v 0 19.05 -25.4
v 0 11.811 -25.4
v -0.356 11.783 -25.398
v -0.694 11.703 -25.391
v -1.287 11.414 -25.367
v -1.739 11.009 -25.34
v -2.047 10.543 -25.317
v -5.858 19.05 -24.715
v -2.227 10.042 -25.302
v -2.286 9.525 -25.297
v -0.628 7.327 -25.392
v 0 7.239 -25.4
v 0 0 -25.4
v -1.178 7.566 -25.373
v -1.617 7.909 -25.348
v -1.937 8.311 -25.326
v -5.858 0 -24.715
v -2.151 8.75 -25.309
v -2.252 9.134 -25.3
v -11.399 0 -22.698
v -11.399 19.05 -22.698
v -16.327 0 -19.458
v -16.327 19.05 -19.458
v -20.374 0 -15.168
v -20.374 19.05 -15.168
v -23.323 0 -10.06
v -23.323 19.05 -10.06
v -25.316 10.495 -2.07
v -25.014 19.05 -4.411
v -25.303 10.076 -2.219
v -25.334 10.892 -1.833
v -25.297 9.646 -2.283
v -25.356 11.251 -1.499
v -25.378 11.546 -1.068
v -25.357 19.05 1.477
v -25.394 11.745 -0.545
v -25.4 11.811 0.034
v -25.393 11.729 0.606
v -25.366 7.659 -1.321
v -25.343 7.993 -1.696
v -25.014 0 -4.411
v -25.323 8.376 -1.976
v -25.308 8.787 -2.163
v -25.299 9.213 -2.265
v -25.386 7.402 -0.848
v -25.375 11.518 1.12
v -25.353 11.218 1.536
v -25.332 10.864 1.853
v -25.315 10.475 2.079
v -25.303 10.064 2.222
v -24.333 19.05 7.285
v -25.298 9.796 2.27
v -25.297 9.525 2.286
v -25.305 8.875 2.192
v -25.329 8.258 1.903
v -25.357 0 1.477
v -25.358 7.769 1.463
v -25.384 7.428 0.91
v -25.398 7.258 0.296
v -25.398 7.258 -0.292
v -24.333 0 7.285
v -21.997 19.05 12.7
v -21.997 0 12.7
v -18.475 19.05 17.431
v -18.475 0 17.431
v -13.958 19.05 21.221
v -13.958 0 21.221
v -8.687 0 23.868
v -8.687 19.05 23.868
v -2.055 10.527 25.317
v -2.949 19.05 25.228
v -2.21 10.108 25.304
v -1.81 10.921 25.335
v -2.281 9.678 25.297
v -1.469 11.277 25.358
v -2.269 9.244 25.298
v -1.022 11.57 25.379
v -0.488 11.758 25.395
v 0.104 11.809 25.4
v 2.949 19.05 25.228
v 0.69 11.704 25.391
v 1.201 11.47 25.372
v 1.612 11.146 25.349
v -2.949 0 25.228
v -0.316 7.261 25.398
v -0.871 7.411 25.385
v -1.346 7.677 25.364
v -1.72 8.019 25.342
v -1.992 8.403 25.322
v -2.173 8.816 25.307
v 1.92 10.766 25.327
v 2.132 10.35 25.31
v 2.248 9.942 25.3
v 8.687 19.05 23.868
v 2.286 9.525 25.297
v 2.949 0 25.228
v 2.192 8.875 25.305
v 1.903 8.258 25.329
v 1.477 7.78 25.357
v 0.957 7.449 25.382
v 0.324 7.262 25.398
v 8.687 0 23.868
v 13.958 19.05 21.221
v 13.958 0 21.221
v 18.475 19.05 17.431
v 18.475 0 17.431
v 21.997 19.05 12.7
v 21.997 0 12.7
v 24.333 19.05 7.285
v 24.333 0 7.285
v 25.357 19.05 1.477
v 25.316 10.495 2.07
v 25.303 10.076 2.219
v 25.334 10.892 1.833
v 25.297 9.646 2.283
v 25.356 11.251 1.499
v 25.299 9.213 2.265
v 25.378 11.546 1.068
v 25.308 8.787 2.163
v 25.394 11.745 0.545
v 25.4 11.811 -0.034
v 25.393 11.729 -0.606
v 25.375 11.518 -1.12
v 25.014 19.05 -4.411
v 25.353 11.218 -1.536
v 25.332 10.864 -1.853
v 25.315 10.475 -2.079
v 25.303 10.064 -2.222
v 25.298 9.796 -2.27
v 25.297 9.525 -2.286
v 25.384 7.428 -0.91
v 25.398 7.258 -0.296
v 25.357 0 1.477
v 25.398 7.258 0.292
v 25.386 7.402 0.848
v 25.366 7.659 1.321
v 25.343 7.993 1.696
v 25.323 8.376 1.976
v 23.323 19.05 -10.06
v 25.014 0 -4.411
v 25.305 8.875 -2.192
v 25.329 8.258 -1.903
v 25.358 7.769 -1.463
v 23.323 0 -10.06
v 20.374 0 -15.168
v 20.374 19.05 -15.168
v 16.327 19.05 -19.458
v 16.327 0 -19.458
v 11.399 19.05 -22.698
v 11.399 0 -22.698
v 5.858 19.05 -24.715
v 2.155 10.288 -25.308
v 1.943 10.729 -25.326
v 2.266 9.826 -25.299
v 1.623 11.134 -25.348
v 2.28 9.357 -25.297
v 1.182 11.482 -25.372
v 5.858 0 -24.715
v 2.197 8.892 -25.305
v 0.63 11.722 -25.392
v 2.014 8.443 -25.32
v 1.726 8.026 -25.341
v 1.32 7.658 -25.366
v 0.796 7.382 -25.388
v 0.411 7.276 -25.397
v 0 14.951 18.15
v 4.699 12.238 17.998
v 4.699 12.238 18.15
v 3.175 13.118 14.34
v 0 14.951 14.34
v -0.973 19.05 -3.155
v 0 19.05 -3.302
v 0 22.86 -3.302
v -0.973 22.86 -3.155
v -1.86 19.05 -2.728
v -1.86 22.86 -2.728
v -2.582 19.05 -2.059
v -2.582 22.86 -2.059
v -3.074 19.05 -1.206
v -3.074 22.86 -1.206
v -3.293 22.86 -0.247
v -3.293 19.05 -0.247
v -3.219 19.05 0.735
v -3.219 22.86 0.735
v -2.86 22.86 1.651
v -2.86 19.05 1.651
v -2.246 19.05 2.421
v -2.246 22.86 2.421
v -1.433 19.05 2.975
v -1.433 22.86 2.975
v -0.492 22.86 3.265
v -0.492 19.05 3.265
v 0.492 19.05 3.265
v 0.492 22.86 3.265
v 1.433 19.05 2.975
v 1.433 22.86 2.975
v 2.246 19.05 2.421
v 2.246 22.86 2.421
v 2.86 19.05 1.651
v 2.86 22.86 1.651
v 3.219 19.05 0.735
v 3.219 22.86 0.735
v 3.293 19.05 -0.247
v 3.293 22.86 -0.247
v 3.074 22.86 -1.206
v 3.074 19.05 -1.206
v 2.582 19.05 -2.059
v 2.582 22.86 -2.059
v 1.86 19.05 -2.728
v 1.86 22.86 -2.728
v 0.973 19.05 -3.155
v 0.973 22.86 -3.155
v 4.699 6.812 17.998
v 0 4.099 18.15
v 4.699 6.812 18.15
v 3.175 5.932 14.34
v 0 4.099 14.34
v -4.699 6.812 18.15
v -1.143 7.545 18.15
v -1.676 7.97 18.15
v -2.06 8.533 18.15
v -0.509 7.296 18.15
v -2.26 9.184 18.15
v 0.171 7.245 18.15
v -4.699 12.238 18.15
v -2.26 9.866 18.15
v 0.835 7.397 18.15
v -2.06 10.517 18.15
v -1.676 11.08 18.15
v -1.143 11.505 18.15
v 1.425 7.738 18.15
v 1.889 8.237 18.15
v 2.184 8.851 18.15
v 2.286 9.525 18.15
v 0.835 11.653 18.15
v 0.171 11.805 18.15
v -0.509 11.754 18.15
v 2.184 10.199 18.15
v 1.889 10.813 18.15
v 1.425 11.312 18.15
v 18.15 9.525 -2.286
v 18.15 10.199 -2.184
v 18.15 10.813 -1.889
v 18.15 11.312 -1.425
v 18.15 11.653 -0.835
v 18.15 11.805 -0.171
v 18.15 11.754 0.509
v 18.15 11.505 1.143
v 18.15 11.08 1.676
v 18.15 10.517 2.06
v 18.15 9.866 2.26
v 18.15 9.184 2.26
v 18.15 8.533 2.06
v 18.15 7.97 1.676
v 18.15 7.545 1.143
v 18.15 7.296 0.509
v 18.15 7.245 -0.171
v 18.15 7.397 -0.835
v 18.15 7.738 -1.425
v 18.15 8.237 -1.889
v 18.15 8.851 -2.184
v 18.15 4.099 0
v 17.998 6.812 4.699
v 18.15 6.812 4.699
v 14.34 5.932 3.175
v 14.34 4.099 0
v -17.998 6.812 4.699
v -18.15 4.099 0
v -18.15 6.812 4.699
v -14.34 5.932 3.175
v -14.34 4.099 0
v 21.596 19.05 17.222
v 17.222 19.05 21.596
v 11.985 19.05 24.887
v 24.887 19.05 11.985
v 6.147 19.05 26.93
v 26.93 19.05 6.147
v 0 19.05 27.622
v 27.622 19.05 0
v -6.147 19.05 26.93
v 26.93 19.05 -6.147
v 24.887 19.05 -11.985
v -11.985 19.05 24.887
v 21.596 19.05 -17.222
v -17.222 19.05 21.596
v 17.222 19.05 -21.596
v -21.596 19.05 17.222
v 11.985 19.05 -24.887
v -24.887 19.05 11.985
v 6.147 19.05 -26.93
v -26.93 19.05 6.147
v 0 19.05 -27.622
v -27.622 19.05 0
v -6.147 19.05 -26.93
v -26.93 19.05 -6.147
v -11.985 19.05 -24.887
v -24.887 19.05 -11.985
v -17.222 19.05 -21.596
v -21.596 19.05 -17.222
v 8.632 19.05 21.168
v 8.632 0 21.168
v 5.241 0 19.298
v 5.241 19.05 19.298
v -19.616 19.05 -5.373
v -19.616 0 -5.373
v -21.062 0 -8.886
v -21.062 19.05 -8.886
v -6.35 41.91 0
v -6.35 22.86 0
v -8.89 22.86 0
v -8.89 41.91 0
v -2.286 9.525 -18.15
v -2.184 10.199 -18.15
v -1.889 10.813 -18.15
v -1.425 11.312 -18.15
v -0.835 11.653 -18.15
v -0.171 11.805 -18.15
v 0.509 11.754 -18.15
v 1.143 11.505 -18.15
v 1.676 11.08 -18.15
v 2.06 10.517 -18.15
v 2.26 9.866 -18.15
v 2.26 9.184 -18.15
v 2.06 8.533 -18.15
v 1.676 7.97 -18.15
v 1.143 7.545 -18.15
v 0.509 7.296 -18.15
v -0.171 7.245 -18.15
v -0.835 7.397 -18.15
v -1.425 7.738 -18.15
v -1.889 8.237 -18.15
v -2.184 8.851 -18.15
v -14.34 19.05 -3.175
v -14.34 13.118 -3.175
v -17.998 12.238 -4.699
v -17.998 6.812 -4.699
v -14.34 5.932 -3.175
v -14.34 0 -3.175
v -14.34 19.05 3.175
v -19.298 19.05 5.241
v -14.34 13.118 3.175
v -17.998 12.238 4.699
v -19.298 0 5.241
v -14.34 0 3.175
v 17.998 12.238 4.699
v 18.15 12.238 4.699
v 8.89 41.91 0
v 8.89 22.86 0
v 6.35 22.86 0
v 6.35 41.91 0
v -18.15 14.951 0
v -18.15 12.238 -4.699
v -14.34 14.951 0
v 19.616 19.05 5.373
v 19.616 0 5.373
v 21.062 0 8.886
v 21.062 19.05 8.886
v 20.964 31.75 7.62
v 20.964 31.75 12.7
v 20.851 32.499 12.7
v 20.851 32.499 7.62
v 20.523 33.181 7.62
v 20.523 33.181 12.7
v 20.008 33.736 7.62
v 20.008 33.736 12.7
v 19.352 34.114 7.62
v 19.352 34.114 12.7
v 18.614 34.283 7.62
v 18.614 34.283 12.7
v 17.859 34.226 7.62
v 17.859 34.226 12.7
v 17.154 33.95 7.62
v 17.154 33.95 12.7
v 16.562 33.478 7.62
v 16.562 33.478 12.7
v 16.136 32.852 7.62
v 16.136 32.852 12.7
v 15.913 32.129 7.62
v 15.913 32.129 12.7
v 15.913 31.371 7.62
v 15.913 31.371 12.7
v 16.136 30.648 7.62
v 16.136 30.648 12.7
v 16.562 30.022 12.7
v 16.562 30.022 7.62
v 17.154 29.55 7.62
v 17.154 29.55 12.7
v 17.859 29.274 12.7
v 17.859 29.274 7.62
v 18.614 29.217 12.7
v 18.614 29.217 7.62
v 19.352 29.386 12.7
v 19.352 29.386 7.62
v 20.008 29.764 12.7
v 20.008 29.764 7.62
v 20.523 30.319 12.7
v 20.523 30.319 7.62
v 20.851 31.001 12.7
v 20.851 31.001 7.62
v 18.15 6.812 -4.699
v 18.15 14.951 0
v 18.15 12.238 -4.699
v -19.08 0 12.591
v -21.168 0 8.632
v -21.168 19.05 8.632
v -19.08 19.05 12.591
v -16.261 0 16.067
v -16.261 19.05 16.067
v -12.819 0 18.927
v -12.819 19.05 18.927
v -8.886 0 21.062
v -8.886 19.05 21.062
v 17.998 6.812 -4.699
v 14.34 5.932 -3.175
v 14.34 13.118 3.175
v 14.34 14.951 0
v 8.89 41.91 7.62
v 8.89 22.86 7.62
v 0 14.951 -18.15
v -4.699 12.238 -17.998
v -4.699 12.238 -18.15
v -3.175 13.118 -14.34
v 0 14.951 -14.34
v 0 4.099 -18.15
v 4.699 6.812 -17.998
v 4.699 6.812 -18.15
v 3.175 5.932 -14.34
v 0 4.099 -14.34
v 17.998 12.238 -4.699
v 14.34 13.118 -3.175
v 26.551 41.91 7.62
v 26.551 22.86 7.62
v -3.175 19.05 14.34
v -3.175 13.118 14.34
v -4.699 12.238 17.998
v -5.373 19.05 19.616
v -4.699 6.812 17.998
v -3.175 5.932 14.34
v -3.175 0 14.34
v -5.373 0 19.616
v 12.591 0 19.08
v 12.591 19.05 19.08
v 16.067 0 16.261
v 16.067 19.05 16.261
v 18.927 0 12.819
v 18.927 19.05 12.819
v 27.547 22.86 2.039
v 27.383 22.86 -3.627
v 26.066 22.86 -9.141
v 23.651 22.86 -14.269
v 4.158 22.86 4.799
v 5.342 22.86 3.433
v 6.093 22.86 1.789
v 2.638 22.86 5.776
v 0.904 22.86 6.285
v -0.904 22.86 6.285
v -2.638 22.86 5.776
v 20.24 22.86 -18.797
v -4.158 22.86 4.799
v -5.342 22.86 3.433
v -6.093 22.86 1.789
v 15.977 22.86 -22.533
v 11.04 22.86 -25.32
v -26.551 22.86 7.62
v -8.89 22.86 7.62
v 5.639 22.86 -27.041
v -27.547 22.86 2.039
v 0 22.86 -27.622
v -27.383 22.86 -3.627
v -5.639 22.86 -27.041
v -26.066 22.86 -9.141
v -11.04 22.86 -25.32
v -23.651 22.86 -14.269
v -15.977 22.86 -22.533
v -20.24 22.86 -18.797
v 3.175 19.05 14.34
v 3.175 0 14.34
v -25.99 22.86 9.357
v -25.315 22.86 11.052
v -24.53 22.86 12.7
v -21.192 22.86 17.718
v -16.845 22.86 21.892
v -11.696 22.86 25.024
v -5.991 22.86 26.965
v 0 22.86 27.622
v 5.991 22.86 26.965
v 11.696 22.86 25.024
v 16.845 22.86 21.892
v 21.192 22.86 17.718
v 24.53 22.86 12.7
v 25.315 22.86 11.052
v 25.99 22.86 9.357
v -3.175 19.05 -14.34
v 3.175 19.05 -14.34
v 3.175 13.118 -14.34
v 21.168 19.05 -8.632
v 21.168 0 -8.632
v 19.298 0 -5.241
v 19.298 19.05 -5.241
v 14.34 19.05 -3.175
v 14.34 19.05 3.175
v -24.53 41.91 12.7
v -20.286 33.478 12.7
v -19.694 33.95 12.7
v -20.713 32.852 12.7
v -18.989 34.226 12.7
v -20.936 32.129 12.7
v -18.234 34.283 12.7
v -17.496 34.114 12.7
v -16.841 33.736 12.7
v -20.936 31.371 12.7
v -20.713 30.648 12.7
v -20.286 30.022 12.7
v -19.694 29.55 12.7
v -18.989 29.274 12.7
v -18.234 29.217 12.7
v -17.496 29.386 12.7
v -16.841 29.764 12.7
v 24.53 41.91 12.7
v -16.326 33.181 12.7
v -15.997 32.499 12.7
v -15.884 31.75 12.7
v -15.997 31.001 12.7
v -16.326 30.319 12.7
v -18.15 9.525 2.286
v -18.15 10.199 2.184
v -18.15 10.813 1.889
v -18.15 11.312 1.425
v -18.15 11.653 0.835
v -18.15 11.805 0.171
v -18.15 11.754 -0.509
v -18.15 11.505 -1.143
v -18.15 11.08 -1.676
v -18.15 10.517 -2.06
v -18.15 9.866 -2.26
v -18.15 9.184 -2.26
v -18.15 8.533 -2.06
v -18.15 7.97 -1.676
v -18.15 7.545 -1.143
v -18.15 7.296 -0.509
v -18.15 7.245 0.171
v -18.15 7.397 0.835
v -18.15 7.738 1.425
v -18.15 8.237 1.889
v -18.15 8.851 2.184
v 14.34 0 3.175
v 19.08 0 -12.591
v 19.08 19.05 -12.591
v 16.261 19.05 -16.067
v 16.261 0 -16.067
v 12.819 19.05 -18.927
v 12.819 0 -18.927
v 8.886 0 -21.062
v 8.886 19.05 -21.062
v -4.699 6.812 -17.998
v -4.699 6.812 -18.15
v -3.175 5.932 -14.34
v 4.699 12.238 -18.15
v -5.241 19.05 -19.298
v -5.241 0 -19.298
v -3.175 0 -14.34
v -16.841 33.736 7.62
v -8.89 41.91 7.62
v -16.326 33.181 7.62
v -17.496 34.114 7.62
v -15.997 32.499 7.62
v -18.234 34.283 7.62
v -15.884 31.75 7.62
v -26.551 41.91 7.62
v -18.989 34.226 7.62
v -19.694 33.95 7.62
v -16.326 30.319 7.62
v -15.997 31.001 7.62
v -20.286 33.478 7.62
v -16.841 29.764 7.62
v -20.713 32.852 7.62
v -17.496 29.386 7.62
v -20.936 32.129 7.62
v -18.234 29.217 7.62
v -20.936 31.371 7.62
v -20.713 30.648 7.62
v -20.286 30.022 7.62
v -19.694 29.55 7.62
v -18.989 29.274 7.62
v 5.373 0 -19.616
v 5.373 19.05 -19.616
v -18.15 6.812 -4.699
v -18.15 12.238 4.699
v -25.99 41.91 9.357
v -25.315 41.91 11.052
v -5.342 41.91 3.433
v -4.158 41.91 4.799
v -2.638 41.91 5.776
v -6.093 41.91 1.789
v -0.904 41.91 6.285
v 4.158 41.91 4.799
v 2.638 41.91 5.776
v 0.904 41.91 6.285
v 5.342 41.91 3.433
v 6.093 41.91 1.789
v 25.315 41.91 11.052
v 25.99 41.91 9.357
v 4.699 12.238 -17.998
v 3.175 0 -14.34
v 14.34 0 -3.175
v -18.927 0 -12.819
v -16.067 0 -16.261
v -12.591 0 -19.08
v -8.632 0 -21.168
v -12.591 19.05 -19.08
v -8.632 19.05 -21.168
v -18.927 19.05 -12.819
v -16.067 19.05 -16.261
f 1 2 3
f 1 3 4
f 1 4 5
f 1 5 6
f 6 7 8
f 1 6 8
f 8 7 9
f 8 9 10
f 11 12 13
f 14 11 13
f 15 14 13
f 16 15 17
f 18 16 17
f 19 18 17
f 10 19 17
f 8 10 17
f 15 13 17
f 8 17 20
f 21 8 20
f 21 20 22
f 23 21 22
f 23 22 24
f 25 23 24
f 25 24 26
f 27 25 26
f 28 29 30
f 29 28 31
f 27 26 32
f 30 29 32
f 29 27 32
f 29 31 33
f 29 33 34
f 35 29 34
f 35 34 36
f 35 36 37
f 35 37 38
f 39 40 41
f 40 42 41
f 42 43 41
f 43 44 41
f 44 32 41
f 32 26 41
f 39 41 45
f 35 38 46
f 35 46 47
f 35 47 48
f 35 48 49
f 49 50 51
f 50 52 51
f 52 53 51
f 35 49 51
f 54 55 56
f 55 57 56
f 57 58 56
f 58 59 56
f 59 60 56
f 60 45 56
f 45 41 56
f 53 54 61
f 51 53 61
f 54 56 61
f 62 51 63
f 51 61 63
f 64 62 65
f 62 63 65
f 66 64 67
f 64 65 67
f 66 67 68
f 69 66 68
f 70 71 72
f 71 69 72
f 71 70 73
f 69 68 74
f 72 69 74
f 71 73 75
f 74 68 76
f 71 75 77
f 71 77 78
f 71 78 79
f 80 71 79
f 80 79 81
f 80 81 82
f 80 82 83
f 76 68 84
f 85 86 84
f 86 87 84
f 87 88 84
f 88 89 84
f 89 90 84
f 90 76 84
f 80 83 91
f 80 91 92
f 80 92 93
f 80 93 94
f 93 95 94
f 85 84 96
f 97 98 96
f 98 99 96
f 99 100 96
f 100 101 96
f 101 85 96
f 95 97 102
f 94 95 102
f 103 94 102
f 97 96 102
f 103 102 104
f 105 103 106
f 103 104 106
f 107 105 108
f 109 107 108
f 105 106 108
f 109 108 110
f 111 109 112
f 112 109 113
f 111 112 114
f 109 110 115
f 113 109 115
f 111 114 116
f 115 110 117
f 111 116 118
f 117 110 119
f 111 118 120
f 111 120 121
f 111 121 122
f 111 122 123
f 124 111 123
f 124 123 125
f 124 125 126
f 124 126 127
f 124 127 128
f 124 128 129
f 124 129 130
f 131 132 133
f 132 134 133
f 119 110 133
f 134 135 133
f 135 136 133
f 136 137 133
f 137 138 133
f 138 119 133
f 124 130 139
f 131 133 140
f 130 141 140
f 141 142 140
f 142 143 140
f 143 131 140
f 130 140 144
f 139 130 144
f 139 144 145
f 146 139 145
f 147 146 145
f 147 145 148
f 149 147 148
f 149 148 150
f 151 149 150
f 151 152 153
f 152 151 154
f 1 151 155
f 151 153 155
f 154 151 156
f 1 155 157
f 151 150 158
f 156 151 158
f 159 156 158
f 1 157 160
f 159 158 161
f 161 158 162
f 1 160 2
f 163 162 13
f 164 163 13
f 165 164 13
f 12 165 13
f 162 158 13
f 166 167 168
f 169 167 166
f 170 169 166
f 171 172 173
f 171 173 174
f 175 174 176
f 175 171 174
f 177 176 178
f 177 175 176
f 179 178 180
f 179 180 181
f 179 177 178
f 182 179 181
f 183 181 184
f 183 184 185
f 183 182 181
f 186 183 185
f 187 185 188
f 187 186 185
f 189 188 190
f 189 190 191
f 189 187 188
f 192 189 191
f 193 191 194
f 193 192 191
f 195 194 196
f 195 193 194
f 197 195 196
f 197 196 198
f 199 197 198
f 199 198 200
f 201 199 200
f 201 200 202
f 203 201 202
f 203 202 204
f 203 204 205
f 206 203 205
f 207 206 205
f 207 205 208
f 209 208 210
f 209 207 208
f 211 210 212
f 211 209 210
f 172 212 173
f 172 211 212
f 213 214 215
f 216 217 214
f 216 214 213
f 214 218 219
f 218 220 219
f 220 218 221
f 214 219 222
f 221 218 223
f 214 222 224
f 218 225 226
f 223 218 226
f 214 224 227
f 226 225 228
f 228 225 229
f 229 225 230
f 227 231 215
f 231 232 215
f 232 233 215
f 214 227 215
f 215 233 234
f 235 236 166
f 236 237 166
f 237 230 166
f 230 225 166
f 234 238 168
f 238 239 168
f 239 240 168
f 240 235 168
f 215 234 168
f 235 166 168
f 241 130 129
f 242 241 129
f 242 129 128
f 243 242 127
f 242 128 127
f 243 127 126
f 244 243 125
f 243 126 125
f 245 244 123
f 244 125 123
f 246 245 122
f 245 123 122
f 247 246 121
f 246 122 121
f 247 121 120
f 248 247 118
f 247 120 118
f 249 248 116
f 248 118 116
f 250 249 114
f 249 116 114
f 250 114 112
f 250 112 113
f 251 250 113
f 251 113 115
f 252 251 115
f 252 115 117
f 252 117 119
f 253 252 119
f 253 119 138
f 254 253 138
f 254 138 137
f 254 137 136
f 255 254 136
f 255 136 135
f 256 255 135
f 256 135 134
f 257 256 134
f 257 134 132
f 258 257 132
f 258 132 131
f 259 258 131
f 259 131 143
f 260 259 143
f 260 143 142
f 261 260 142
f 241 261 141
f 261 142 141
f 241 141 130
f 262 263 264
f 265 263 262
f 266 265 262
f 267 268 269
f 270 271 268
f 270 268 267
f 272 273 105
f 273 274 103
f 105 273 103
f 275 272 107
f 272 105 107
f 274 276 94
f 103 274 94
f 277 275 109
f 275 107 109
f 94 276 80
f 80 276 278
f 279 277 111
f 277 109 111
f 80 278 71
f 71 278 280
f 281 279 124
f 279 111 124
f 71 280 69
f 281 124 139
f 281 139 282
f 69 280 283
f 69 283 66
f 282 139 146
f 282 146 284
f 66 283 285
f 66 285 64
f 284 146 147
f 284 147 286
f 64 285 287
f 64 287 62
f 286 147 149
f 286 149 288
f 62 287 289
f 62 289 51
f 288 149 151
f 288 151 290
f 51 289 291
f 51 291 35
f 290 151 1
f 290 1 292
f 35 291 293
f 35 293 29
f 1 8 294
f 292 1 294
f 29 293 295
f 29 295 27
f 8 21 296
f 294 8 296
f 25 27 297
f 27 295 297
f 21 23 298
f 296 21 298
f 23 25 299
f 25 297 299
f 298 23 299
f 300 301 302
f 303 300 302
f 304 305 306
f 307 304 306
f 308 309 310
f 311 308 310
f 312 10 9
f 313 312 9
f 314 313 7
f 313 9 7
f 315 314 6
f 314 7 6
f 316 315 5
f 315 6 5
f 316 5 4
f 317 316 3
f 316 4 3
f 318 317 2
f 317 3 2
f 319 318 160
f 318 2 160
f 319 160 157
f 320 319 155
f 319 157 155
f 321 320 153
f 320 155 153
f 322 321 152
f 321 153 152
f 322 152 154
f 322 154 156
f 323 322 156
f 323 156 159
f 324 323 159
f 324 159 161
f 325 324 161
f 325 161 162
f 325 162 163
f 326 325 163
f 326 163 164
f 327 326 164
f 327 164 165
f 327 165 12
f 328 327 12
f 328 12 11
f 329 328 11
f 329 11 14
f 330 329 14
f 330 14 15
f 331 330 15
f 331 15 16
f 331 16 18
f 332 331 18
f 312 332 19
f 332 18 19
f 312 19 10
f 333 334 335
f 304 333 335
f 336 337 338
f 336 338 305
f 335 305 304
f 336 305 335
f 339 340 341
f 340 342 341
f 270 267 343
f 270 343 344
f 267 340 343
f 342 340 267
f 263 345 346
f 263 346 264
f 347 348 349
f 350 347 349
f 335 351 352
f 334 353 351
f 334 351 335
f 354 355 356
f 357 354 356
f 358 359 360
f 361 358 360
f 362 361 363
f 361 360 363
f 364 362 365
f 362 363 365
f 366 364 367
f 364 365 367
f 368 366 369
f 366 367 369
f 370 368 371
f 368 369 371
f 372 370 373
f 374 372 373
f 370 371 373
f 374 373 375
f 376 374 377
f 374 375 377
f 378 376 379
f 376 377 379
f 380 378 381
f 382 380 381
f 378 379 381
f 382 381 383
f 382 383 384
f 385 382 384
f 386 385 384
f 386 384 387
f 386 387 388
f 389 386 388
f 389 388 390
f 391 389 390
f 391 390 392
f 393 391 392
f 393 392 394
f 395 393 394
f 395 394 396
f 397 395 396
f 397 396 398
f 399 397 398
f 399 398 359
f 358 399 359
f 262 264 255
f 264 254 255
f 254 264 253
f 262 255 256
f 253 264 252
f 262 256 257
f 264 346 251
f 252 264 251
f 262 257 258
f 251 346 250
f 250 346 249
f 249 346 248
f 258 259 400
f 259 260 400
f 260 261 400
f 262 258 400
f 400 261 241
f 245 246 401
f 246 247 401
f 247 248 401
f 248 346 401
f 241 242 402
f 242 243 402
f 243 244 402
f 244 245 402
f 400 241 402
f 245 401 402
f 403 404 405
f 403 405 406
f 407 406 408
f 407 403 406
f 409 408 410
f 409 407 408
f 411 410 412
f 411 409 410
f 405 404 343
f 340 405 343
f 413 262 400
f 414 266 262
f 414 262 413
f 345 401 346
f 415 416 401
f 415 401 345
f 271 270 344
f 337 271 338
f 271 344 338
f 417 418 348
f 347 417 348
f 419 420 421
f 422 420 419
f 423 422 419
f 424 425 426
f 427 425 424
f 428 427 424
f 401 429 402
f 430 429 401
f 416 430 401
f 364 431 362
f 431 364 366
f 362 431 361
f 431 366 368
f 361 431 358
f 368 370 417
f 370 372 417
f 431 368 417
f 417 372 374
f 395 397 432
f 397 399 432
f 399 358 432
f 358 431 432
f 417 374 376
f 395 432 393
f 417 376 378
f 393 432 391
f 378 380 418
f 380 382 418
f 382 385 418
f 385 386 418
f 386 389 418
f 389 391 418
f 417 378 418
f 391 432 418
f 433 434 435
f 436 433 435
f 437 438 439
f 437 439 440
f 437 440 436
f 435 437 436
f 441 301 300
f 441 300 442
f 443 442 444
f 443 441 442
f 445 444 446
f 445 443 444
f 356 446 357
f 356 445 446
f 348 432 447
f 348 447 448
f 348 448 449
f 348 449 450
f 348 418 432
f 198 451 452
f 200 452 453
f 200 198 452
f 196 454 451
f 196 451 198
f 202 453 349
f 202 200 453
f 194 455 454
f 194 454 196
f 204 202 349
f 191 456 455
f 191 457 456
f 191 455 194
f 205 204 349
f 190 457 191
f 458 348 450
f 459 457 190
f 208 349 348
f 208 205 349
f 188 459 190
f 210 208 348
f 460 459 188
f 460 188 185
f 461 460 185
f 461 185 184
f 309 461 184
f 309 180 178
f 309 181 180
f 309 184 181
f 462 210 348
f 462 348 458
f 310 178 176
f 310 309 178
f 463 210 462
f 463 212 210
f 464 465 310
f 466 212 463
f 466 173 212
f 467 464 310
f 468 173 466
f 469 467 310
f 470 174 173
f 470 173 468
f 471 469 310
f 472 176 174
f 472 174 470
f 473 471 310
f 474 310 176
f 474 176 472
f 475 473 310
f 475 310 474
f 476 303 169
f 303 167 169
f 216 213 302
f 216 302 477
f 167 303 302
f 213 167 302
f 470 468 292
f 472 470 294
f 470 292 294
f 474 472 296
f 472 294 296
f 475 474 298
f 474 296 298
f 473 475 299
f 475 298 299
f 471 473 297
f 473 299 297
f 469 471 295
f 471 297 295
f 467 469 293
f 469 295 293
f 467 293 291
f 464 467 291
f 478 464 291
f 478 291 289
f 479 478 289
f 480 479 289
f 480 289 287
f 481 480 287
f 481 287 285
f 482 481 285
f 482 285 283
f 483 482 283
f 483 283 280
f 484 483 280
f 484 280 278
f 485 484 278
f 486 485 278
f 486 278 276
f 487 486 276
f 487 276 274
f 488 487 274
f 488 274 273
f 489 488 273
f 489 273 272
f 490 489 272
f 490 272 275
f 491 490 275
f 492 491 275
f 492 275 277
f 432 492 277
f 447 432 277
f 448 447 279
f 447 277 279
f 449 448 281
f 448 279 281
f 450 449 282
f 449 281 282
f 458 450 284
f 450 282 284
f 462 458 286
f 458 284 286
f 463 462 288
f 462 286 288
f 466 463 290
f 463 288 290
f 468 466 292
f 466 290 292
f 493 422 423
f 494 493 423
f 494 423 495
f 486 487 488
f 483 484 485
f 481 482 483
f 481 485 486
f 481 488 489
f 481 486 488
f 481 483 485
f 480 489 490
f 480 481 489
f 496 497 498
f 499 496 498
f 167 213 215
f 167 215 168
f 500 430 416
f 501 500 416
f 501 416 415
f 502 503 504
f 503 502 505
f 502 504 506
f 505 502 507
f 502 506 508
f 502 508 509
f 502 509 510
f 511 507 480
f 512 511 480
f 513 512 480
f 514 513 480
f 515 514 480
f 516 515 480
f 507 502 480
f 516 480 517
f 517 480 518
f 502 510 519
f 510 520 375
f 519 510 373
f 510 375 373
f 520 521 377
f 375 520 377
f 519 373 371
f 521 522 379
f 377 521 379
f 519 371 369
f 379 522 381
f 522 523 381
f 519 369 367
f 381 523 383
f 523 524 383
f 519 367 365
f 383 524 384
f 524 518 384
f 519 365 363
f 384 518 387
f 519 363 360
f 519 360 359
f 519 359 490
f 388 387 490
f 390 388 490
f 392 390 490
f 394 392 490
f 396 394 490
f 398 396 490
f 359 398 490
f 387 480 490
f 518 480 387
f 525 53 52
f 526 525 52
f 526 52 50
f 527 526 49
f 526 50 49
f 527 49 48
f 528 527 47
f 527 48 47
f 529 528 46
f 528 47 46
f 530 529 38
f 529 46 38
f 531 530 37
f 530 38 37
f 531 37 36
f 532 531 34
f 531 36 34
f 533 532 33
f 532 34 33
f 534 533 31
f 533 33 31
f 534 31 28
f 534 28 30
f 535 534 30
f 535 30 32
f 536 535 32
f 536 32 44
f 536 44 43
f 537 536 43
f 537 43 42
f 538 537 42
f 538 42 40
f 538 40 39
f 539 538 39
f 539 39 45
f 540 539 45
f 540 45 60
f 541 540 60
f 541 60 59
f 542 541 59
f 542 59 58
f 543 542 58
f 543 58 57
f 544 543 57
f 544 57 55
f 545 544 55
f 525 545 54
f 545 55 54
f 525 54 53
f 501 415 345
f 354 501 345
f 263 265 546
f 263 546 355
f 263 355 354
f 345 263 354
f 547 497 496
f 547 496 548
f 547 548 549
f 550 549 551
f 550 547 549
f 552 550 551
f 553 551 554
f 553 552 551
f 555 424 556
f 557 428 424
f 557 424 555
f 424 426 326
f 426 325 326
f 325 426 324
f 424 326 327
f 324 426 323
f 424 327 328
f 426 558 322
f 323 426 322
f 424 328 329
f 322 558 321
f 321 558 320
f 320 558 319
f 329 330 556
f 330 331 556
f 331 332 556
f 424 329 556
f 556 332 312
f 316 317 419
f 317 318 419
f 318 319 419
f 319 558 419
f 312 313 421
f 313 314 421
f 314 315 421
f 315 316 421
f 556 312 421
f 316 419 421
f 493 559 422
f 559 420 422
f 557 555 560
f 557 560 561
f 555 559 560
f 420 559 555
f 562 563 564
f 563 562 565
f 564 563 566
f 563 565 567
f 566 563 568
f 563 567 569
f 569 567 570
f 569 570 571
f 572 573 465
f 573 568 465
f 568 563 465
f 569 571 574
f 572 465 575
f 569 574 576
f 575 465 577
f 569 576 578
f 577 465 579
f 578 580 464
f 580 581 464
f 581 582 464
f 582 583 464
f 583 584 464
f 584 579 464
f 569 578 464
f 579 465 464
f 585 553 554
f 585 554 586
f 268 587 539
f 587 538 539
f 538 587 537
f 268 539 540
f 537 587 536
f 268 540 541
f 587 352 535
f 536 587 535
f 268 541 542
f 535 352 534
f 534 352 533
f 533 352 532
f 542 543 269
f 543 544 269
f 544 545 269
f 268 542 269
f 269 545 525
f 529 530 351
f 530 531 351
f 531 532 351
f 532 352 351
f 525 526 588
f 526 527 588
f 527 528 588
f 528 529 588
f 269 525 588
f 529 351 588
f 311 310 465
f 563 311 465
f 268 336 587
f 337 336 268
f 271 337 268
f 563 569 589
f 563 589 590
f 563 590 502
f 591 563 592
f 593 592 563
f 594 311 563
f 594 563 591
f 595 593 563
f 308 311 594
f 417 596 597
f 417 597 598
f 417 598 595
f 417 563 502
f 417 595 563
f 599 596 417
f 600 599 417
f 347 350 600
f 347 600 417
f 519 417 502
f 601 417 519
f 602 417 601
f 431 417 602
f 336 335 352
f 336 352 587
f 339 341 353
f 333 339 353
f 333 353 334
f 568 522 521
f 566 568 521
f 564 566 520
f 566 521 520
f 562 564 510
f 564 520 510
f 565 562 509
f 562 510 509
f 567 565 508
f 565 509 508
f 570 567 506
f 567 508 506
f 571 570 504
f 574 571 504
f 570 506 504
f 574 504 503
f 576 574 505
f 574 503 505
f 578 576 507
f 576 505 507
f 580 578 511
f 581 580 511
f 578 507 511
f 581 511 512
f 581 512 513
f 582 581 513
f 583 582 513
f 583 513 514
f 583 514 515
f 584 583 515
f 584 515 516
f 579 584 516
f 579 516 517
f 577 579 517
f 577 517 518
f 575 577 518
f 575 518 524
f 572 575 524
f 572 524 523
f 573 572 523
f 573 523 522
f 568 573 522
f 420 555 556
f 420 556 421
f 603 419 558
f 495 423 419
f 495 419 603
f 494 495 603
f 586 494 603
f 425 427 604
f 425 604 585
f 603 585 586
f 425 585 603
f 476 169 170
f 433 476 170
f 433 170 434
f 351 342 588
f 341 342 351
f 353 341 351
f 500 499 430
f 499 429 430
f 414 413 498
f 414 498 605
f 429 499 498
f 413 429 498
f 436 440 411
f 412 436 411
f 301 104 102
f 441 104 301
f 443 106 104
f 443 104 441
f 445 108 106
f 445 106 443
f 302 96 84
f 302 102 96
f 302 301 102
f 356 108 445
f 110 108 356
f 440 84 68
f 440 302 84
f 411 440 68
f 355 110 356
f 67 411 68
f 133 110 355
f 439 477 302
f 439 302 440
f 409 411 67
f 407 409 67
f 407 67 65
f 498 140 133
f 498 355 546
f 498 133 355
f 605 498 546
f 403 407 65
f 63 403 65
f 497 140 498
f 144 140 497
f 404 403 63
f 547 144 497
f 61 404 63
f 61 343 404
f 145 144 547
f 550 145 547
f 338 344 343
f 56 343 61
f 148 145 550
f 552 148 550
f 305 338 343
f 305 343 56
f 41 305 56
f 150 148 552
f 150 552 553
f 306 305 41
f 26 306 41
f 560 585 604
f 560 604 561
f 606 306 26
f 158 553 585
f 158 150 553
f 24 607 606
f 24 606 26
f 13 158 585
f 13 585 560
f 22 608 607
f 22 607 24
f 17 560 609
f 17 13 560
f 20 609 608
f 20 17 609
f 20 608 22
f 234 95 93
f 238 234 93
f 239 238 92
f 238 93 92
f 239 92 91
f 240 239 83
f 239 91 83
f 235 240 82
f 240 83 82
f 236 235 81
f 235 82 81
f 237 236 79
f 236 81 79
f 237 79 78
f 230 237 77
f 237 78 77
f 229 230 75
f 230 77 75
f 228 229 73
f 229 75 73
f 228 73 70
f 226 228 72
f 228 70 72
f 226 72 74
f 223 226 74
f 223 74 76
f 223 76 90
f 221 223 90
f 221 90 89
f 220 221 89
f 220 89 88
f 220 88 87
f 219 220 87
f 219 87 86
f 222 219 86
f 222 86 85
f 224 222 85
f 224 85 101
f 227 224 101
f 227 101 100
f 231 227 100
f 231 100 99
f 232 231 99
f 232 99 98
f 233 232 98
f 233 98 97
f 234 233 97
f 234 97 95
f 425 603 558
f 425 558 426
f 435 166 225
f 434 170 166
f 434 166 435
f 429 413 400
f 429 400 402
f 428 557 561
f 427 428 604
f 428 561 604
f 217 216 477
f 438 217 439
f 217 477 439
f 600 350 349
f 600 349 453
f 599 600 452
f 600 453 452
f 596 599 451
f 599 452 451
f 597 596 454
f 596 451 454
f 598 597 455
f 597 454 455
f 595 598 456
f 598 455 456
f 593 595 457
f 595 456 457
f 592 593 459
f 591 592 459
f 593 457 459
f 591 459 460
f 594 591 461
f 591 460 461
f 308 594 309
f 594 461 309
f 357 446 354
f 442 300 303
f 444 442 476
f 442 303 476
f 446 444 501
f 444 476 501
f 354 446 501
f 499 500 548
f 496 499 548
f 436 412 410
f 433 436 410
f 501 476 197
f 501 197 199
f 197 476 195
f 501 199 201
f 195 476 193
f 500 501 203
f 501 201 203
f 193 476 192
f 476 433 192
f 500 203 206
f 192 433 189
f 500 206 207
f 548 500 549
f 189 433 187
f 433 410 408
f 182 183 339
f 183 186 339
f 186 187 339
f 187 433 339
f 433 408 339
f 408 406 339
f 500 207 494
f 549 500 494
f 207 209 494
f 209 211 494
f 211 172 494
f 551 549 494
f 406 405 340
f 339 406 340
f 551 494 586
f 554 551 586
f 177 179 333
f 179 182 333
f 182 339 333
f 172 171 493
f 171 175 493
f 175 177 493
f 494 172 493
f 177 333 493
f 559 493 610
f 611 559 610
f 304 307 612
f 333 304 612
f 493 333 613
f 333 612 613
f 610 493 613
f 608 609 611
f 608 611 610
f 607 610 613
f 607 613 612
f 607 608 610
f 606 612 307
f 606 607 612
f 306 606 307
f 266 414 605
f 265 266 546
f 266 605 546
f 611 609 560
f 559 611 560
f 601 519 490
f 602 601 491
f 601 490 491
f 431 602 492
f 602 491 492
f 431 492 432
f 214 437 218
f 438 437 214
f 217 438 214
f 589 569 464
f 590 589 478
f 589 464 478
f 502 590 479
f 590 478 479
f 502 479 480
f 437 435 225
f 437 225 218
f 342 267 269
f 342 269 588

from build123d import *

# Parameters (mm, degrees)
SKETCH1_R                  = 25.4
SKETCH1_R_2                = 22.86
TUBE_CONNECTION_RING_DEPTH = 19.05
SKETCH6_R                  = 2.286
SCREW_HOLE_DEPTH           = 19.05
NUT_PRESS_FIT_HOLE_START   = -11.059647
NUT_PRESS_FIT_HOLE_DEPTH   = 3.81
CIRPATTERN1_COUNT          = 4
SCREW_HOLE_CHAMFER_SIZE    = 2.884664172
SCREW_HOLE_CHAMFER_SIZE_2  = 2.54
SKETCH12_R                 = 27.6225
SKETCH12_R_2               = 3.302
TOP_PLATE_DEPTH            = 3.81
HINGE_HOLE_DEPTH           = 19.05
HINGE_HOLE_CUT_REACH       = 66.384
SKETCH14_R                 = 2.54


with BuildPart() as part:
    # Sketch1 → tube_connection_ring (new body)
    # profile 1 of 5: a face of its own
    with BuildSketch(Plane(origin=(0, 0, 0), x_dir=(1, 0, 0), z_dir=(0, 1, 0))):
        with Locations(Location((0, 0, 0), (0, 0, 90))):
            Circle(SKETCH1_R)
        Circle(SKETCH1_R_2, mode=Mode.SUBTRACT)
    # profile 2 of 5: a face of its own
    with BuildSketch(Plane(origin=(0, 0, 0), x_dir=(1, 0, 0), z_dir=(0, 1, 0))):
        with BuildLine():
            ThreePointArc((22.86, 0), (22.633970791, 3.206706444), (21.960352912, 6.35))
            Line((21.960352912, 6.35), (14.340352912, 3.175))
            Line((14.340352912, 3.175), (14.340352912, -3.175))
            Line((14.340352912, -3.175), (21.960352912, -6.35))
            ThreePointArc((21.960352912, -6.35), (22.633970791, -3.206706444), (22.86, 0))
        make_face()
    # profile 3 of 5: a face of its own
    with BuildSketch(Plane(origin=(0, 0, 0), x_dir=(1, 0, 0), z_dir=(0, 1, 0))):
        with BuildLine():
            ThreePointArc((-6.35, -21.960352912), (0, -22.86), (6.35, -21.960352912))
            Line((6.35, -21.960352912), (3.175, -14.340352912))
            Line((3.175, -14.340352912), (-3.175, -14.340352912))
            Line((-3.175, -14.340352912), (-6.35, -21.960352912))
        make_face()
    # profile 4 of 5: a face of its own
    with BuildSketch(Plane(origin=(0, 0, 0), x_dir=(1, 0, 0), z_dir=(0, 1, 0))):
        with BuildLine():
            Line((-14.340352912, 3.175), (-21.960352912, 6.35))
            ThreePointArc((-21.960352912, 6.35), (-22.86, 0), (-21.960352912, -6.35))
            Line((-21.960352912, -6.35), (-14.340352912, -3.175))
            Line((-14.340352912, -3.175), (-14.340352912, 3.175))
        make_face()
    # profile 5 of 5: a face of its own
    with BuildSketch(Plane(origin=(0, 0, 0), x_dir=(1, 0, 0), z_dir=(0, 1, 0))):
        with BuildLine():
            Line((3.175, 14.340352912), (6.35, 21.960352912))
            ThreePointArc((6.35, 21.960352912), (0, 22.86), (-6.35, 21.960352912))
            Line((-6.35, 21.960352912), (-3.175, 14.340352912))
            Line((-3.175, 14.340352912), (3.175, 14.340352912))
        make_face()
    extrude(amount=TUBE_CONNECTION_RING_DEPTH)

    # Sketch6 → screw_hole (cut)
    with BuildSketch(Plane(origin=(25.4, 0, 0), x_dir=(0, 0, -1), z_dir=(1, 0, 0))):
        with Locations((0, 9.525)):
            Circle(SKETCH6_R)
    screw_hole = extrude(amount=-SCREW_HOLE_DEPTH, mode=Mode.SUBTRACT)

    # Sketch11 → nut_press_fit_hole (cut)
    with BuildSketch(Plane(origin=(25.4, 0, 0), x_dir=(0, 0, -1), z_dir=(1, 0, 0)).offset(NUT_PRESS_FIT_HOLE_START)):
        Polygon((0, 4.09906217), (4.699, 6.812031085), (4.699, 12.237968915), (0, 14.95093783), (-4.699, 12.237968915), (-4.699, 6.812031085), align=None)
    nut_press_fit_hole = extrude(amount=NUT_PRESS_FIT_HOLE_DEPTH, mode=Mode.SUBTRACT)

    # CirPattern1: screw_hole, nut_press_fit_hole ×4 about axis
    cirpattern1_axis = Axis((0, 0, 0), (0, 1, 0))
    add([screw_hole.rotate(cirpattern1_axis, i * 360 / CIRPATTERN1_COUNT) for i in range(1, CIRPATTERN1_COUNT)], mode=Mode.SUBTRACT)
    add([nut_press_fit_hole.rotate(cirpattern1_axis, i * 360 / CIRPATTERN1_COUNT) for i in range(1, CIRPATTERN1_COUNT)], mode=Mode.SUBTRACT)

    # screw_hole_chamfer
    # the kernel refuses this chamfer: 2.884664172, 2.54 mm, written as the material it adds along each edge
    with BuildSketch(Plane(origin=(-6.35, 0, -21.960352912), x_dir=(-0.9446263547307573, 0, 0.32814790864499105), z_dir=(0, 1, 0)), Plane(origin=(-21.960352912, 0, 6.35), x_dir=(0.3281479086449895, 0, 0.944626354730758), z_dir=(0, 1, 0)), Plane(origin=(6.35, 0, 21.960352912), x_dir=(0.9446263547307586, 0, -0.32814790864498755), z_dir=(0, 1, 0)), Plane(origin=(21.960352912, 0, -6.35), x_dir=(-0.3281479086449886, 0, -0.9446263547307582), z_dir=(0, 1, 0))) as screw_hole_chamfer_piece_1:
        with BuildLine():
            Line((2.415733057, 0), (-SCREW_HOLE_CHAMFER_SIZE * 0.0604120669079, SCREW_HOLE_CHAMFER_SIZE * 0.998173522936))
            Line((-SCREW_HOLE_CHAMFER_SIZE * 0.0604120669079, SCREW_HOLE_CHAMFER_SIZE * 0.998173522936), (0, 0))
            ThreePointArc((0, 0), (1.246430784, -0.031900132), (2.415733057, 0))
        make_face()
    extrude(amount=19.05)
    with BuildSketch(Plane(origin=(-21.960352912, 0, -6.35), x_dir=(0.9230769230769231, 0, 0.38461538461538464), z_dir=(0, 1, 0)), Plane(origin=(-6.35, 0, 21.960352912), x_dir=(0.3846153846153849, 0, -0.9230769230769229), z_dir=(0, 1, 0)), Plane(origin=(21.960352912, 0, 6.35), x_dir=(-0.9230769230769229, 0, -0.3846153846153849), z_dir=(0, 1, 0))) as screw_hole_chamfer_piece_2:
        with BuildLine():
            Line((SCREW_HOLE_CHAMFER_SIZE_2, 0), (-0.146371443, 2.686371443))
            ThreePointArc((-0.146371443, 2.686371443), (-0.11503611, 1.383925534), (0, 0))
            Line((0, 0), (SCREW_HOLE_CHAMFER_SIZE_2, 0))
        make_face()
    extrude(amount=19.05)
    with BuildSketch(Plane(origin=(6.35, 0, -21.960352912), x_dir=(0.9426351264301257, 0, 0.3338248319404367), z_dir=(0, 1, 0))) as screw_hole_chamfer_piece_3:
        with BuildLine():
            Line((2.690356134, 0), (-SCREW_HOLE_CHAMFER_SIZE_2 * 0.0544059729896, -SCREW_HOLE_CHAMFER_SIZE_2 * 0.99851889822))
            Line((-SCREW_HOLE_CHAMFER_SIZE_2 * 0.0544059729896, -SCREW_HOLE_CHAMFER_SIZE_2 * 0.99851889822), (0, 0))
            ThreePointArc((0, 0), (1.388134451, 0.039571914), (2.690356134, 0))
        make_face()
    extrude(amount=19.05)

    # Sketch12 → top_plate (add)
    with BuildSketch(Plane(origin=(0, 19.05, 0), x_dir=(1, 0, 0), z_dir=(0, 1, 0))):
        with Locations(Location((0, 0, 0), (0, 0, 90))):
            Circle(SKETCH12_R)
        with Locations(Location((0, 0, 0), (0, 0, 90))):
            Circle(SKETCH12_R_2, mode=Mode.SUBTRACT)
    extrude(amount=TOP_PLATE_DEPTH)

    # Sketch13 → hinge_hole (add)
    with BuildSketch(Plane(origin=(0, 22.86, 0), x_dir=(1, 0, 0), z_dir=(0, 1, 0))):
        with BuildLine():
            ThreePointArc((24.529828908, -12.7), (25.666241564, -10.210119991), (26.550670542, -7.62))
            Line((26.550670542, -7.62), (8.89, -7.62))
            Line((8.89, -7.62), (8.89, 0))
            Line((8.89, 0), (6.35, 0))
            ThreePointArc((6.35, 0), (0, -6.35), (-6.35, 0))
            Line((-6.35, 0), (-8.89, 0))
            Line((-8.89, 0), (-8.89, -7.62))
            Line((-8.89, -7.62), (-26.550670542, -7.62))
            ThreePointArc((-26.550670542, -7.62), (-25.666241564, -10.210119991), (-24.529828908, -12.7))
            Line((-24.529828908, -12.7), (24.529828908, -12.7))
        make_face()
    extrude(amount=HINGE_HOLE_DEPTH)

    # Sketch14 → hinge_hole_cut (cut, up to next)
    with BuildSketch(Plane.XY.offset(12.7), mode=Mode.PRIVATE) as hinge_hole_cut_sk1:
        with Locations((18.424251671, 31.75)):
            Circle(SKETCH14_R)
    hinge_hole_cut_tool1 = extrude(hinge_hole_cut_sk1.sketch, amount=-HINGE_HOLE_CUT_REACH, mode=Mode.PRIVATE) & part.part
    # Sketch14 → hinge_hole_cut (cut, up to next)
    with BuildSketch(Plane.XY.offset(12.7), mode=Mode.PRIVATE) as hinge_hole_cut_sk2:
        with Locations((-18.424251671, 31.75)):
            Circle(SKETCH14_R)
    hinge_hole_cut_tool2 = extrude(hinge_hole_cut_sk2.sketch, amount=-HINGE_HOLE_CUT_REACH, mode=Mode.PRIVATE) & part.part
    add(hinge_hole_cut_tool1.solids().sort_by_distance((18.424252, 31.75, 12.7))[0], mode=Mode.SUBTRACT)
    add(hinge_hole_cut_tool2.solids().sort_by_distance((-18.424252, 31.75, 12.7))[0], mode=Mode.SUBTRACT)


solid = part.part
